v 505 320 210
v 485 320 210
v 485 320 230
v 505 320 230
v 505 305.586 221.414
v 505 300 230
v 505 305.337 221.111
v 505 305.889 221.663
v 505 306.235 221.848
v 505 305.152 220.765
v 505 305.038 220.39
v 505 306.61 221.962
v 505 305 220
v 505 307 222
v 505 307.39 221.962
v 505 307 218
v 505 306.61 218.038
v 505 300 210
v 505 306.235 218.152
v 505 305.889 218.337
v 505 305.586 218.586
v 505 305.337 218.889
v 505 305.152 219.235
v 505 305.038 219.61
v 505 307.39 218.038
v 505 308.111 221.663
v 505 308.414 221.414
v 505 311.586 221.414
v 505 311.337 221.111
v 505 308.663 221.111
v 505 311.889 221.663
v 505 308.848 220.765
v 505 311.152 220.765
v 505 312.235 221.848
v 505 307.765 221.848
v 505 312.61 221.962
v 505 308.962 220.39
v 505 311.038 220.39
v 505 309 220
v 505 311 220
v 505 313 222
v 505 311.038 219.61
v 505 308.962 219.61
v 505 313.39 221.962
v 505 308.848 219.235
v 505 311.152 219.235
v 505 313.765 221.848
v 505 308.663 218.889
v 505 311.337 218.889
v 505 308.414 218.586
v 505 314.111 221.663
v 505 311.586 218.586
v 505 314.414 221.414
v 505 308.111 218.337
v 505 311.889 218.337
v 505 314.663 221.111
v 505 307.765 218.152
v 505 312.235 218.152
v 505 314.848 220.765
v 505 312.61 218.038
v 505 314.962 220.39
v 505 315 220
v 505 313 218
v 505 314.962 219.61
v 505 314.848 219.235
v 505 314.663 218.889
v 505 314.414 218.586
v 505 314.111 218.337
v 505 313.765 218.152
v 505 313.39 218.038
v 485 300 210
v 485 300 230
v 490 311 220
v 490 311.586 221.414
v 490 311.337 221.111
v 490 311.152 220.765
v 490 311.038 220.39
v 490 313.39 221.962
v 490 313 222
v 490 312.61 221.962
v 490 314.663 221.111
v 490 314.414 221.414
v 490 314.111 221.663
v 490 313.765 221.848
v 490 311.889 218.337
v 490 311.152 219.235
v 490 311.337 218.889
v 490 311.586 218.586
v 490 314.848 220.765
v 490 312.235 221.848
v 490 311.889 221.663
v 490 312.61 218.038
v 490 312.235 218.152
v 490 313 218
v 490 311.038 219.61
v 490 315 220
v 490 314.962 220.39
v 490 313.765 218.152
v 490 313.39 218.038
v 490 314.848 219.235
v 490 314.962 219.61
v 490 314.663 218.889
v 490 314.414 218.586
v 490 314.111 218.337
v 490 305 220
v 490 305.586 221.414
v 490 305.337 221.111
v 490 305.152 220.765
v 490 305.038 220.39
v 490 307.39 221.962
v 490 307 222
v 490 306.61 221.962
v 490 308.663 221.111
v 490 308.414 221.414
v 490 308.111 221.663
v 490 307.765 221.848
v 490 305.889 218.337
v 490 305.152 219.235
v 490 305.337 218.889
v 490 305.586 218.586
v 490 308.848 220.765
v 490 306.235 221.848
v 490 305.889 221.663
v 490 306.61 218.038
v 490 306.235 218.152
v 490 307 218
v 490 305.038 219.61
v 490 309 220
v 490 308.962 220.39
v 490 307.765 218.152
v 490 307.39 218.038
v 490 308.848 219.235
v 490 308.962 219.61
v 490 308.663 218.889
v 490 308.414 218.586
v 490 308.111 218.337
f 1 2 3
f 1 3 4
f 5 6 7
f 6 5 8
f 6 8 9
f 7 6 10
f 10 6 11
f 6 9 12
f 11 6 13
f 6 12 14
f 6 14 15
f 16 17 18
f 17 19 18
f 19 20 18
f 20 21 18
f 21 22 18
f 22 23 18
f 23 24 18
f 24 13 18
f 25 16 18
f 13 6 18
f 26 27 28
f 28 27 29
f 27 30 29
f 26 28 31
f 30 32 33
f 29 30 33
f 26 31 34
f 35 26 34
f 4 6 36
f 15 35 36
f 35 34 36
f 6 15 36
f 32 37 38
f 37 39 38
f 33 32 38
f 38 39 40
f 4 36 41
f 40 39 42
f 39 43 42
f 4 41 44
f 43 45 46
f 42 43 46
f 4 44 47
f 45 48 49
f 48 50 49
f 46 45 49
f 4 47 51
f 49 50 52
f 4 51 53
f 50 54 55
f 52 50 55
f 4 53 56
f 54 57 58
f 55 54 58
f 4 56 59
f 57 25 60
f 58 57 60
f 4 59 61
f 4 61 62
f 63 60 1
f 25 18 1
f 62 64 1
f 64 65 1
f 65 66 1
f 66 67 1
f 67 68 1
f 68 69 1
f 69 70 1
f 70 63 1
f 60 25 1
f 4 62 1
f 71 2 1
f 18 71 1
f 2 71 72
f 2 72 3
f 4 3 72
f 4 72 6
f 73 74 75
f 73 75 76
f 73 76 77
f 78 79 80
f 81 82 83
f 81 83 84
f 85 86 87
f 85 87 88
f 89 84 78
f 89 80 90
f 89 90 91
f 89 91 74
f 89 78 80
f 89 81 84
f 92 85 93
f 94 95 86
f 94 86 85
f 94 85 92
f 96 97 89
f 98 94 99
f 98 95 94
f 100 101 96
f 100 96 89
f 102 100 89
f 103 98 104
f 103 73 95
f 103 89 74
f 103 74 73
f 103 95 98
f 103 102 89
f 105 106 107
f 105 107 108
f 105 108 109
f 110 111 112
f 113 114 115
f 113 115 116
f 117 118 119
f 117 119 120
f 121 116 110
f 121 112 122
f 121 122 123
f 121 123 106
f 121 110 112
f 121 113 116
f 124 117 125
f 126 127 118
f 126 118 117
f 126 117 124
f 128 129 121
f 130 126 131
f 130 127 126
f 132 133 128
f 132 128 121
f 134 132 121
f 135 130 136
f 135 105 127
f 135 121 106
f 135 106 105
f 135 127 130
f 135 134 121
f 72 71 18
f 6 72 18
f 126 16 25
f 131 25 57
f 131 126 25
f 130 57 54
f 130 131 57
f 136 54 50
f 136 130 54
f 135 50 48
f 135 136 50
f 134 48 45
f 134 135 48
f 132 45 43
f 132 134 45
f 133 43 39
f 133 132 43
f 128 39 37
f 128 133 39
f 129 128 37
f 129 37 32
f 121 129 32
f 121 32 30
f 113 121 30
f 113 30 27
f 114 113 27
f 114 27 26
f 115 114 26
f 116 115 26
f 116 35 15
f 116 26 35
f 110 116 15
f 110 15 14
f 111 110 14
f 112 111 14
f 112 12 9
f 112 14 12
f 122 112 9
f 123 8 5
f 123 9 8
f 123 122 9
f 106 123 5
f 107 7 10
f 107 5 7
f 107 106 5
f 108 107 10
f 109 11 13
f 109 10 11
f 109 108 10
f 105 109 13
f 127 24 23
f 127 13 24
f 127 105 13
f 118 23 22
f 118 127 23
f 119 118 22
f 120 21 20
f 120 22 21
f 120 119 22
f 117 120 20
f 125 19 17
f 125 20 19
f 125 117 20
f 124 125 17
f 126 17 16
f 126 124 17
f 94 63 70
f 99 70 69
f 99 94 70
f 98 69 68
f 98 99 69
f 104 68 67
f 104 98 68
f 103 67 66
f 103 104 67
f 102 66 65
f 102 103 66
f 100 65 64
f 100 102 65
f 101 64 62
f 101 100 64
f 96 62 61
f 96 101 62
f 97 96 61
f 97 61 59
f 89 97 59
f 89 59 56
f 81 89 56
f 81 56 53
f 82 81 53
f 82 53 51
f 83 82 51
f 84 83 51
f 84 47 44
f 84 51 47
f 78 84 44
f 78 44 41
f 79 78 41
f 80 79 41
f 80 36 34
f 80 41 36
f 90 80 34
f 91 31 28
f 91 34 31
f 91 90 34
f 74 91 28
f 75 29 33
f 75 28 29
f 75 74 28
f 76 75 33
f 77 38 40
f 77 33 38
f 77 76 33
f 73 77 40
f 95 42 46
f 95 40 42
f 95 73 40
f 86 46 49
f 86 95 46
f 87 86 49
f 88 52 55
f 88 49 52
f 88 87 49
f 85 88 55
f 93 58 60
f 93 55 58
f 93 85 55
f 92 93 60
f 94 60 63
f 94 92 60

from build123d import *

# Parameters (mm, degrees)
CYLINDER003_R           = 2
CYLINDER003_DEPTH       = 30
CYLINDER003_PITCH_ANGLE = 90
CYLINDER002_R           = 2
CYLINDER002_DEPTH       = 30
CYLINDER002_PITCH_ANGLE = 90
BOX005_W                = 20
BOX005_H                = 20
BOX005_DEPTH            = 20


with BuildPart() as cylinder001:
    # Cylinder003 → Cylinder003 (new body)
    with BuildSketch(Plane.XY):
        Circle(CYLINDER003_R)
    extrude(amount=CYLINDER003_DEPTH)


with BuildPart() as cylinder001_1:
    # Cylinder003 pitch: moved
    add(cylinder001.part.rotate(Axis((0, 0, 0), (0, 1, 0)), CYLINDER003_PITCH_ANGLE))


with BuildPart() as cylinder001_2:
    # Cylinder003 placement: moved
    add(cylinder001_1.part.moved(Location((490, 313, 220))))


with BuildPart() as cylinder:
    # Cylinder002 → Cylinder002 (new body)
    with BuildSketch(Plane.XY):
        Circle(CYLINDER002_R)
    extrude(amount=CYLINDER002_DEPTH)


with BuildPart() as cylinder_1:
    # Cylinder002 pitch: moved
    add(cylinder.part.rotate(Axis((0, 0, 0), (0, 1, 0)), CYLINDER002_PITCH_ANGLE))


with BuildPart() as cylinder_2:
    # Cylinder002 placement: moved
    add(cylinder_1.part.moved(Location((490, 307, 220))))


with BuildPart() as plug001:
    # Box005 → Box005 (new body)
    with BuildSketch(Plane(origin=(485, 300, 210), x_dir=(1, 0, 0), z_dir=(0, 0, 1))):
        with Locations((10, 10)):
            Rectangle(BOX005_W, BOX005_H)
    extrude(amount=BOX005_DEPTH)

    # Cut001: cut Cylinder
    add(cylinder_2.part, mode=Mode.SUBTRACT)

    # Cut002: cut Cylinder001
    add(cylinder001_2.part, mode=Mode.SUBTRACT)


solid = plug001.part
